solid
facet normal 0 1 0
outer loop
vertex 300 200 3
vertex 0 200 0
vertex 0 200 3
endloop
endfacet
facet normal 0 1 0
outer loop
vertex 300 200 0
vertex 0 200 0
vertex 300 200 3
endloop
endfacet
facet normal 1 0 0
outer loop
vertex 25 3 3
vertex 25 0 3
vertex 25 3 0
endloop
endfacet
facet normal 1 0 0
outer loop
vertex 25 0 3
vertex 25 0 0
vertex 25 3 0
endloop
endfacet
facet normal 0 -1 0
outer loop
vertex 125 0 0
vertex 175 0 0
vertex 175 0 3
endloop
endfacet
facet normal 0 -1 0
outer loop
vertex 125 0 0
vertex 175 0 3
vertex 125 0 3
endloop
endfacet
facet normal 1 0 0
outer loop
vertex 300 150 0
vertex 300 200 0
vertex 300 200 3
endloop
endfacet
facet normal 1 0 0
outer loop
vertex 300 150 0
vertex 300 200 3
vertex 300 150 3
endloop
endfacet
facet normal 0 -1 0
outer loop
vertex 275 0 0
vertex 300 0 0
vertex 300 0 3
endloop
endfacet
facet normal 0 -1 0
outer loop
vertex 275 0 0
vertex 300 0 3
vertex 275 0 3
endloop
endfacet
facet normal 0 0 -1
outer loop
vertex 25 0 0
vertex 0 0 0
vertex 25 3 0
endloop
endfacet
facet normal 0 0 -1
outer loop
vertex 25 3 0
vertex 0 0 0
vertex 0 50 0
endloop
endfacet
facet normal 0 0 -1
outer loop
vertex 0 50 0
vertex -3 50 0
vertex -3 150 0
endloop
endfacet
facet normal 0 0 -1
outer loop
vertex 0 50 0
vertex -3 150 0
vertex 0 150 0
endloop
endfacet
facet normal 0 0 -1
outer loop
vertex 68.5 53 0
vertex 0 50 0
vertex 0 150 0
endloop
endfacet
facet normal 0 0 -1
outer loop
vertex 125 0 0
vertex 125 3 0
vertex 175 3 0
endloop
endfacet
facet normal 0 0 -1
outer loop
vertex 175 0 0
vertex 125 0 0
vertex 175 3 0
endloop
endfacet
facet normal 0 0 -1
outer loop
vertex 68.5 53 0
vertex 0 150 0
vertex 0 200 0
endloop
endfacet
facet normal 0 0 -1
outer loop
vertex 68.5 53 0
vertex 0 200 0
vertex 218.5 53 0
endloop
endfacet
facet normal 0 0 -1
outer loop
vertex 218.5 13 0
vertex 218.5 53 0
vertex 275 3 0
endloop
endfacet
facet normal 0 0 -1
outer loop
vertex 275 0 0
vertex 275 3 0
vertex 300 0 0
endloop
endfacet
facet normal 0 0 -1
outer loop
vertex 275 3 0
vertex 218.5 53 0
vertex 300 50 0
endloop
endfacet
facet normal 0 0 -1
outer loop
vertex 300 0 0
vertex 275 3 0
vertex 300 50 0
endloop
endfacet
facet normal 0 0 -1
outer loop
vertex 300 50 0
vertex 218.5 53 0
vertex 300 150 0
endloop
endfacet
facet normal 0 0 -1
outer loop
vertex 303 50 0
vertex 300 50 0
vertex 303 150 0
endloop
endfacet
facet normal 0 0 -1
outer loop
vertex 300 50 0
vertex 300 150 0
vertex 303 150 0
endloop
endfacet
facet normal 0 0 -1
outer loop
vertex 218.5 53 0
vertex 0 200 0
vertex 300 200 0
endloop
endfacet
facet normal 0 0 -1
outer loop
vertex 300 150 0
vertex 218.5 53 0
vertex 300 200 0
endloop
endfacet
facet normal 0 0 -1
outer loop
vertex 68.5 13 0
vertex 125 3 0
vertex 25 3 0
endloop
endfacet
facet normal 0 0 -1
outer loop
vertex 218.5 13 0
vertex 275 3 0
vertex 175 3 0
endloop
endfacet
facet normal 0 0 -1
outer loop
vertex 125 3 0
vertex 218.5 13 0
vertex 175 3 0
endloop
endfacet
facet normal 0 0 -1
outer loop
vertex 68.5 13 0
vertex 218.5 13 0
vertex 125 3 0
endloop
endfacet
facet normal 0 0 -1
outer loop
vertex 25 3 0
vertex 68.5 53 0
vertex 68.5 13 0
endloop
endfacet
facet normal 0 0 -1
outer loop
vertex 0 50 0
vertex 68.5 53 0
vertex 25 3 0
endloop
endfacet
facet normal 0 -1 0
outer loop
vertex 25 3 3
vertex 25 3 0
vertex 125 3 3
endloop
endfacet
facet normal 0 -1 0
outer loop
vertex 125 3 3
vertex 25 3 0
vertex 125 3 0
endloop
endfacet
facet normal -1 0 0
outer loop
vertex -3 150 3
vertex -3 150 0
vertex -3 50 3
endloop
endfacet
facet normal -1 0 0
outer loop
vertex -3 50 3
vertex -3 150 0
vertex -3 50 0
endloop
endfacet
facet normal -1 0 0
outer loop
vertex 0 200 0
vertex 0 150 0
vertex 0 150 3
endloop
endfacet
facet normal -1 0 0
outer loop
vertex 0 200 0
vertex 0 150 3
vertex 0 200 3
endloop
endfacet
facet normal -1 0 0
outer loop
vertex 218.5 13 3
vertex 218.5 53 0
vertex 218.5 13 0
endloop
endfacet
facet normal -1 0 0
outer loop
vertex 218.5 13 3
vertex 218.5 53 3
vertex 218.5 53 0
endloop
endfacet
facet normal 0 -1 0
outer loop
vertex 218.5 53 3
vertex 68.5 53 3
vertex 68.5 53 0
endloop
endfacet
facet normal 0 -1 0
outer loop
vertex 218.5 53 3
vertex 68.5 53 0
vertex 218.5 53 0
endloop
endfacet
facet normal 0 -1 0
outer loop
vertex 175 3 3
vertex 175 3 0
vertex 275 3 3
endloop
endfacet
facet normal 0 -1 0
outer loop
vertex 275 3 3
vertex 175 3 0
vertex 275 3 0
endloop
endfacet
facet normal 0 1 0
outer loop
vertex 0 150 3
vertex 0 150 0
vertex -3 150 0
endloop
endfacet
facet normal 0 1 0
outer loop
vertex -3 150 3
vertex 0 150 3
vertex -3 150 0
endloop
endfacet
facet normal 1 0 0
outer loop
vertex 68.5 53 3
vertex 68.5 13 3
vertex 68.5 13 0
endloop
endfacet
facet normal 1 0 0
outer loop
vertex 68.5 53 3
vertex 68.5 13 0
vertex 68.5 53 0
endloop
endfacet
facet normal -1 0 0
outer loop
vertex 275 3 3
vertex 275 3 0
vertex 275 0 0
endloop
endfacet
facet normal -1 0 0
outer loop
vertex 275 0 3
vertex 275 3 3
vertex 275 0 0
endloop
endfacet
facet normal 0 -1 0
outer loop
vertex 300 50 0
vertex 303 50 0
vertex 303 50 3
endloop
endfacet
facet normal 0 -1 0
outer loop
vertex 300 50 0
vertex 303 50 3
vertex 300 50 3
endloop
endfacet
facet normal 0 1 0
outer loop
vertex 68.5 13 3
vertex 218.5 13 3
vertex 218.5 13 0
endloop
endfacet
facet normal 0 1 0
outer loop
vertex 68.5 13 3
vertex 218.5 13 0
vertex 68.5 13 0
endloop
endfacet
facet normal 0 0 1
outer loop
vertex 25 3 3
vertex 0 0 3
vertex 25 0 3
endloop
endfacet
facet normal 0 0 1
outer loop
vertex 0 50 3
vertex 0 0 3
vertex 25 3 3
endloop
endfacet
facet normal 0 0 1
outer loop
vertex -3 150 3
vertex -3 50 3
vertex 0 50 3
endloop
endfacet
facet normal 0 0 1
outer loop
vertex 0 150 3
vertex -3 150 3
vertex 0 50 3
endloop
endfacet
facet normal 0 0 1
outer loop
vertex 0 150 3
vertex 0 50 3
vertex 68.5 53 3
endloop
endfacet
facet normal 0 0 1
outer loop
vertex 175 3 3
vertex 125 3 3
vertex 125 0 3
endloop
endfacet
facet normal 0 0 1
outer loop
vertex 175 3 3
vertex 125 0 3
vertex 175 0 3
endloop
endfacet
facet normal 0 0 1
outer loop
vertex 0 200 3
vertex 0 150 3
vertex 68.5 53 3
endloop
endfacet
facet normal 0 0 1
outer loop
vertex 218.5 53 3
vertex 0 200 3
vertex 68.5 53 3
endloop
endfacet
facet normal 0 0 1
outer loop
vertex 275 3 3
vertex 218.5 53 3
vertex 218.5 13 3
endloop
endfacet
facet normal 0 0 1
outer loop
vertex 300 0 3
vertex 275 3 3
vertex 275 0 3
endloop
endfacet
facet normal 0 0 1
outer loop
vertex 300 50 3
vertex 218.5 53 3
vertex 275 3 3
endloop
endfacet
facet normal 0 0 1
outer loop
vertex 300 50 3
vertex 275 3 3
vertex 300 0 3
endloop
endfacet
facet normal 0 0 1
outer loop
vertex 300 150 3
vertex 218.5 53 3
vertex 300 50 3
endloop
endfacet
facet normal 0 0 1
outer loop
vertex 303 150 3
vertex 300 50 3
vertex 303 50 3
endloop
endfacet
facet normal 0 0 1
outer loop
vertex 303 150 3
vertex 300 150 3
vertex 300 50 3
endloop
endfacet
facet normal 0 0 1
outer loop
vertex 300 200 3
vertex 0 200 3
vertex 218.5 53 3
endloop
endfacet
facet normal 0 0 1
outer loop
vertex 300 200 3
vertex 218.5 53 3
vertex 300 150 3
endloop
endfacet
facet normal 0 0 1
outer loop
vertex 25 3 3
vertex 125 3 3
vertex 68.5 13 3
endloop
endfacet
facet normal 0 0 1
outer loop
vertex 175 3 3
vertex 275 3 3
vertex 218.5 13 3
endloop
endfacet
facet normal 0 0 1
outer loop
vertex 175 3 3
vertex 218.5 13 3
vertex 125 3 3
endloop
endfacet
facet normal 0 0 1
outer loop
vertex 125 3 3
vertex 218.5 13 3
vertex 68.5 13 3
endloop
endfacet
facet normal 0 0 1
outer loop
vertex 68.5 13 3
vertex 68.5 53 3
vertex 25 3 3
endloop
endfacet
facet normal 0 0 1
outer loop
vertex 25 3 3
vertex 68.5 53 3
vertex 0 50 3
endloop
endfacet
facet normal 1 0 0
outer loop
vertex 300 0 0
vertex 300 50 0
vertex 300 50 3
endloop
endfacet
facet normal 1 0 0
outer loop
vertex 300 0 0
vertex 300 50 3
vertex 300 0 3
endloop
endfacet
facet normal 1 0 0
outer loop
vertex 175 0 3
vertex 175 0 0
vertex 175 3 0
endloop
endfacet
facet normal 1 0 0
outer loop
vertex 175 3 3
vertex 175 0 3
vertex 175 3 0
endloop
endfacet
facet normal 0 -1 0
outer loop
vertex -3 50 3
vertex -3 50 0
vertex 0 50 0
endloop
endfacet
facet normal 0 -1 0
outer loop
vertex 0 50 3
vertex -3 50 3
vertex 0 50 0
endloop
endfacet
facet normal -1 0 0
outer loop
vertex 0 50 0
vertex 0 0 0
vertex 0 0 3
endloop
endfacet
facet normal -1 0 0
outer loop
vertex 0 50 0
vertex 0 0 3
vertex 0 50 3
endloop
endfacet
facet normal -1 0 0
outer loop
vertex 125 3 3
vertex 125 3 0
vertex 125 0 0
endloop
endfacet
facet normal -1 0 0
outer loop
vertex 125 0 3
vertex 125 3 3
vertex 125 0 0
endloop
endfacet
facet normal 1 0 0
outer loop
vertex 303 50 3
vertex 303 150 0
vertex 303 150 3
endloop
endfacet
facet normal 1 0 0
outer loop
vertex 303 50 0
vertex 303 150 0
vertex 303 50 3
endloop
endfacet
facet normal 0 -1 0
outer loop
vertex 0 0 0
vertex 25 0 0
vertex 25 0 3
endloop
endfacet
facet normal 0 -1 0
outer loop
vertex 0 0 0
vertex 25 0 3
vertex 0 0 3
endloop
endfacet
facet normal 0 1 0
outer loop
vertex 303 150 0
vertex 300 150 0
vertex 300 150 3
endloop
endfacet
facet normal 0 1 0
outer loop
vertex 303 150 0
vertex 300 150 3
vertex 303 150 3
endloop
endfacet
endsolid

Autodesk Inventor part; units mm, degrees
ref_plane "YZ Plane" through (0, 0, 0) normal (1, 0, 0) x (0, 1, 0)
ref_plane "XZ Plane" through (0, 0, 0) normal (0, 1, 0) x (-1, 0, 0)
ref_plane "XY Plane" through (0, 0, 0) normal (0, 0, 1) x (1, 0, 0)
sketch "Boceto1" plane through (0, 0, 0) normal (0, 0, 1) x (1, 0, 0)
  line L0 (0, 200) -> (300, 200)
  line L1 (25, 0) -> (25, 3)
  line L2 (25, 3) -> (125, 3)
  line L3 (125, 3) -> (125, 0)
  line L4 (175, 0) -> (175, 3)
  line L5 (175, 3) -> (275, 3)
  line L6 (275, 3) -> (275, 0)
  line L7 (25, 0) -> (0, 0)
  line L8 (300, 0) -> (275, 0)
  line L9 (175, 0) -> (125, 0)
  line L10 (0, 150) -> (-3, 150)
  line L11 (-3, 150) -> (-3, 50)
  line L12 (-3, 50) -> (0, 50)
  line L13 (0, 0) -> (0, 50)
  line L14 (0, 150) -> (0, 200)
  line L15 (300, 150) -> (303, 150)
  line L16 (303, 150) -> (303, 50)
  line L17 (303, 50) -> (300, 50)
  line L18 (300, 200) -> (300, 150)
  line L19 (300, 50) -> (300, 0)
  dimension "d4" = 100
  dimension "d6" = 100
  dimension "d10" = 50
  dimension "d13" = 3
  dimension "d14" = 200
  dimension "d15" = 3
  dimension "d16" = 100
  dimension "d17" = 50
  dimension "d21" = 300
extrude "Extrusión1" add sketch "Boceto1" along normal blind 3
sketch "Boceto2" plane through (0, 0, 3) normal (0, 0, 1) x (1, 0, 0)
  line L0 (68.5, 53) -> (218.5, 53)
  line L1 (218.5, 53) -> (218.5, 13)
  line L2 (218.5, 13) -> (68.5, 13)
  line L3 (68.5, 13) -> (68.5, 53)
  line L4 (0, 50) -> (0, 0) projected
  line L5 (25, 3) -> (125, 3) projected
  dimension "d22" = 40
  dimension "d23" = 150
  dimension "d26" = 68.5
  dimension "d27" = 10
extrude "Extrusión2" cut sketch "Boceto2" against normal blind 3
properties part number "Base lateral"
